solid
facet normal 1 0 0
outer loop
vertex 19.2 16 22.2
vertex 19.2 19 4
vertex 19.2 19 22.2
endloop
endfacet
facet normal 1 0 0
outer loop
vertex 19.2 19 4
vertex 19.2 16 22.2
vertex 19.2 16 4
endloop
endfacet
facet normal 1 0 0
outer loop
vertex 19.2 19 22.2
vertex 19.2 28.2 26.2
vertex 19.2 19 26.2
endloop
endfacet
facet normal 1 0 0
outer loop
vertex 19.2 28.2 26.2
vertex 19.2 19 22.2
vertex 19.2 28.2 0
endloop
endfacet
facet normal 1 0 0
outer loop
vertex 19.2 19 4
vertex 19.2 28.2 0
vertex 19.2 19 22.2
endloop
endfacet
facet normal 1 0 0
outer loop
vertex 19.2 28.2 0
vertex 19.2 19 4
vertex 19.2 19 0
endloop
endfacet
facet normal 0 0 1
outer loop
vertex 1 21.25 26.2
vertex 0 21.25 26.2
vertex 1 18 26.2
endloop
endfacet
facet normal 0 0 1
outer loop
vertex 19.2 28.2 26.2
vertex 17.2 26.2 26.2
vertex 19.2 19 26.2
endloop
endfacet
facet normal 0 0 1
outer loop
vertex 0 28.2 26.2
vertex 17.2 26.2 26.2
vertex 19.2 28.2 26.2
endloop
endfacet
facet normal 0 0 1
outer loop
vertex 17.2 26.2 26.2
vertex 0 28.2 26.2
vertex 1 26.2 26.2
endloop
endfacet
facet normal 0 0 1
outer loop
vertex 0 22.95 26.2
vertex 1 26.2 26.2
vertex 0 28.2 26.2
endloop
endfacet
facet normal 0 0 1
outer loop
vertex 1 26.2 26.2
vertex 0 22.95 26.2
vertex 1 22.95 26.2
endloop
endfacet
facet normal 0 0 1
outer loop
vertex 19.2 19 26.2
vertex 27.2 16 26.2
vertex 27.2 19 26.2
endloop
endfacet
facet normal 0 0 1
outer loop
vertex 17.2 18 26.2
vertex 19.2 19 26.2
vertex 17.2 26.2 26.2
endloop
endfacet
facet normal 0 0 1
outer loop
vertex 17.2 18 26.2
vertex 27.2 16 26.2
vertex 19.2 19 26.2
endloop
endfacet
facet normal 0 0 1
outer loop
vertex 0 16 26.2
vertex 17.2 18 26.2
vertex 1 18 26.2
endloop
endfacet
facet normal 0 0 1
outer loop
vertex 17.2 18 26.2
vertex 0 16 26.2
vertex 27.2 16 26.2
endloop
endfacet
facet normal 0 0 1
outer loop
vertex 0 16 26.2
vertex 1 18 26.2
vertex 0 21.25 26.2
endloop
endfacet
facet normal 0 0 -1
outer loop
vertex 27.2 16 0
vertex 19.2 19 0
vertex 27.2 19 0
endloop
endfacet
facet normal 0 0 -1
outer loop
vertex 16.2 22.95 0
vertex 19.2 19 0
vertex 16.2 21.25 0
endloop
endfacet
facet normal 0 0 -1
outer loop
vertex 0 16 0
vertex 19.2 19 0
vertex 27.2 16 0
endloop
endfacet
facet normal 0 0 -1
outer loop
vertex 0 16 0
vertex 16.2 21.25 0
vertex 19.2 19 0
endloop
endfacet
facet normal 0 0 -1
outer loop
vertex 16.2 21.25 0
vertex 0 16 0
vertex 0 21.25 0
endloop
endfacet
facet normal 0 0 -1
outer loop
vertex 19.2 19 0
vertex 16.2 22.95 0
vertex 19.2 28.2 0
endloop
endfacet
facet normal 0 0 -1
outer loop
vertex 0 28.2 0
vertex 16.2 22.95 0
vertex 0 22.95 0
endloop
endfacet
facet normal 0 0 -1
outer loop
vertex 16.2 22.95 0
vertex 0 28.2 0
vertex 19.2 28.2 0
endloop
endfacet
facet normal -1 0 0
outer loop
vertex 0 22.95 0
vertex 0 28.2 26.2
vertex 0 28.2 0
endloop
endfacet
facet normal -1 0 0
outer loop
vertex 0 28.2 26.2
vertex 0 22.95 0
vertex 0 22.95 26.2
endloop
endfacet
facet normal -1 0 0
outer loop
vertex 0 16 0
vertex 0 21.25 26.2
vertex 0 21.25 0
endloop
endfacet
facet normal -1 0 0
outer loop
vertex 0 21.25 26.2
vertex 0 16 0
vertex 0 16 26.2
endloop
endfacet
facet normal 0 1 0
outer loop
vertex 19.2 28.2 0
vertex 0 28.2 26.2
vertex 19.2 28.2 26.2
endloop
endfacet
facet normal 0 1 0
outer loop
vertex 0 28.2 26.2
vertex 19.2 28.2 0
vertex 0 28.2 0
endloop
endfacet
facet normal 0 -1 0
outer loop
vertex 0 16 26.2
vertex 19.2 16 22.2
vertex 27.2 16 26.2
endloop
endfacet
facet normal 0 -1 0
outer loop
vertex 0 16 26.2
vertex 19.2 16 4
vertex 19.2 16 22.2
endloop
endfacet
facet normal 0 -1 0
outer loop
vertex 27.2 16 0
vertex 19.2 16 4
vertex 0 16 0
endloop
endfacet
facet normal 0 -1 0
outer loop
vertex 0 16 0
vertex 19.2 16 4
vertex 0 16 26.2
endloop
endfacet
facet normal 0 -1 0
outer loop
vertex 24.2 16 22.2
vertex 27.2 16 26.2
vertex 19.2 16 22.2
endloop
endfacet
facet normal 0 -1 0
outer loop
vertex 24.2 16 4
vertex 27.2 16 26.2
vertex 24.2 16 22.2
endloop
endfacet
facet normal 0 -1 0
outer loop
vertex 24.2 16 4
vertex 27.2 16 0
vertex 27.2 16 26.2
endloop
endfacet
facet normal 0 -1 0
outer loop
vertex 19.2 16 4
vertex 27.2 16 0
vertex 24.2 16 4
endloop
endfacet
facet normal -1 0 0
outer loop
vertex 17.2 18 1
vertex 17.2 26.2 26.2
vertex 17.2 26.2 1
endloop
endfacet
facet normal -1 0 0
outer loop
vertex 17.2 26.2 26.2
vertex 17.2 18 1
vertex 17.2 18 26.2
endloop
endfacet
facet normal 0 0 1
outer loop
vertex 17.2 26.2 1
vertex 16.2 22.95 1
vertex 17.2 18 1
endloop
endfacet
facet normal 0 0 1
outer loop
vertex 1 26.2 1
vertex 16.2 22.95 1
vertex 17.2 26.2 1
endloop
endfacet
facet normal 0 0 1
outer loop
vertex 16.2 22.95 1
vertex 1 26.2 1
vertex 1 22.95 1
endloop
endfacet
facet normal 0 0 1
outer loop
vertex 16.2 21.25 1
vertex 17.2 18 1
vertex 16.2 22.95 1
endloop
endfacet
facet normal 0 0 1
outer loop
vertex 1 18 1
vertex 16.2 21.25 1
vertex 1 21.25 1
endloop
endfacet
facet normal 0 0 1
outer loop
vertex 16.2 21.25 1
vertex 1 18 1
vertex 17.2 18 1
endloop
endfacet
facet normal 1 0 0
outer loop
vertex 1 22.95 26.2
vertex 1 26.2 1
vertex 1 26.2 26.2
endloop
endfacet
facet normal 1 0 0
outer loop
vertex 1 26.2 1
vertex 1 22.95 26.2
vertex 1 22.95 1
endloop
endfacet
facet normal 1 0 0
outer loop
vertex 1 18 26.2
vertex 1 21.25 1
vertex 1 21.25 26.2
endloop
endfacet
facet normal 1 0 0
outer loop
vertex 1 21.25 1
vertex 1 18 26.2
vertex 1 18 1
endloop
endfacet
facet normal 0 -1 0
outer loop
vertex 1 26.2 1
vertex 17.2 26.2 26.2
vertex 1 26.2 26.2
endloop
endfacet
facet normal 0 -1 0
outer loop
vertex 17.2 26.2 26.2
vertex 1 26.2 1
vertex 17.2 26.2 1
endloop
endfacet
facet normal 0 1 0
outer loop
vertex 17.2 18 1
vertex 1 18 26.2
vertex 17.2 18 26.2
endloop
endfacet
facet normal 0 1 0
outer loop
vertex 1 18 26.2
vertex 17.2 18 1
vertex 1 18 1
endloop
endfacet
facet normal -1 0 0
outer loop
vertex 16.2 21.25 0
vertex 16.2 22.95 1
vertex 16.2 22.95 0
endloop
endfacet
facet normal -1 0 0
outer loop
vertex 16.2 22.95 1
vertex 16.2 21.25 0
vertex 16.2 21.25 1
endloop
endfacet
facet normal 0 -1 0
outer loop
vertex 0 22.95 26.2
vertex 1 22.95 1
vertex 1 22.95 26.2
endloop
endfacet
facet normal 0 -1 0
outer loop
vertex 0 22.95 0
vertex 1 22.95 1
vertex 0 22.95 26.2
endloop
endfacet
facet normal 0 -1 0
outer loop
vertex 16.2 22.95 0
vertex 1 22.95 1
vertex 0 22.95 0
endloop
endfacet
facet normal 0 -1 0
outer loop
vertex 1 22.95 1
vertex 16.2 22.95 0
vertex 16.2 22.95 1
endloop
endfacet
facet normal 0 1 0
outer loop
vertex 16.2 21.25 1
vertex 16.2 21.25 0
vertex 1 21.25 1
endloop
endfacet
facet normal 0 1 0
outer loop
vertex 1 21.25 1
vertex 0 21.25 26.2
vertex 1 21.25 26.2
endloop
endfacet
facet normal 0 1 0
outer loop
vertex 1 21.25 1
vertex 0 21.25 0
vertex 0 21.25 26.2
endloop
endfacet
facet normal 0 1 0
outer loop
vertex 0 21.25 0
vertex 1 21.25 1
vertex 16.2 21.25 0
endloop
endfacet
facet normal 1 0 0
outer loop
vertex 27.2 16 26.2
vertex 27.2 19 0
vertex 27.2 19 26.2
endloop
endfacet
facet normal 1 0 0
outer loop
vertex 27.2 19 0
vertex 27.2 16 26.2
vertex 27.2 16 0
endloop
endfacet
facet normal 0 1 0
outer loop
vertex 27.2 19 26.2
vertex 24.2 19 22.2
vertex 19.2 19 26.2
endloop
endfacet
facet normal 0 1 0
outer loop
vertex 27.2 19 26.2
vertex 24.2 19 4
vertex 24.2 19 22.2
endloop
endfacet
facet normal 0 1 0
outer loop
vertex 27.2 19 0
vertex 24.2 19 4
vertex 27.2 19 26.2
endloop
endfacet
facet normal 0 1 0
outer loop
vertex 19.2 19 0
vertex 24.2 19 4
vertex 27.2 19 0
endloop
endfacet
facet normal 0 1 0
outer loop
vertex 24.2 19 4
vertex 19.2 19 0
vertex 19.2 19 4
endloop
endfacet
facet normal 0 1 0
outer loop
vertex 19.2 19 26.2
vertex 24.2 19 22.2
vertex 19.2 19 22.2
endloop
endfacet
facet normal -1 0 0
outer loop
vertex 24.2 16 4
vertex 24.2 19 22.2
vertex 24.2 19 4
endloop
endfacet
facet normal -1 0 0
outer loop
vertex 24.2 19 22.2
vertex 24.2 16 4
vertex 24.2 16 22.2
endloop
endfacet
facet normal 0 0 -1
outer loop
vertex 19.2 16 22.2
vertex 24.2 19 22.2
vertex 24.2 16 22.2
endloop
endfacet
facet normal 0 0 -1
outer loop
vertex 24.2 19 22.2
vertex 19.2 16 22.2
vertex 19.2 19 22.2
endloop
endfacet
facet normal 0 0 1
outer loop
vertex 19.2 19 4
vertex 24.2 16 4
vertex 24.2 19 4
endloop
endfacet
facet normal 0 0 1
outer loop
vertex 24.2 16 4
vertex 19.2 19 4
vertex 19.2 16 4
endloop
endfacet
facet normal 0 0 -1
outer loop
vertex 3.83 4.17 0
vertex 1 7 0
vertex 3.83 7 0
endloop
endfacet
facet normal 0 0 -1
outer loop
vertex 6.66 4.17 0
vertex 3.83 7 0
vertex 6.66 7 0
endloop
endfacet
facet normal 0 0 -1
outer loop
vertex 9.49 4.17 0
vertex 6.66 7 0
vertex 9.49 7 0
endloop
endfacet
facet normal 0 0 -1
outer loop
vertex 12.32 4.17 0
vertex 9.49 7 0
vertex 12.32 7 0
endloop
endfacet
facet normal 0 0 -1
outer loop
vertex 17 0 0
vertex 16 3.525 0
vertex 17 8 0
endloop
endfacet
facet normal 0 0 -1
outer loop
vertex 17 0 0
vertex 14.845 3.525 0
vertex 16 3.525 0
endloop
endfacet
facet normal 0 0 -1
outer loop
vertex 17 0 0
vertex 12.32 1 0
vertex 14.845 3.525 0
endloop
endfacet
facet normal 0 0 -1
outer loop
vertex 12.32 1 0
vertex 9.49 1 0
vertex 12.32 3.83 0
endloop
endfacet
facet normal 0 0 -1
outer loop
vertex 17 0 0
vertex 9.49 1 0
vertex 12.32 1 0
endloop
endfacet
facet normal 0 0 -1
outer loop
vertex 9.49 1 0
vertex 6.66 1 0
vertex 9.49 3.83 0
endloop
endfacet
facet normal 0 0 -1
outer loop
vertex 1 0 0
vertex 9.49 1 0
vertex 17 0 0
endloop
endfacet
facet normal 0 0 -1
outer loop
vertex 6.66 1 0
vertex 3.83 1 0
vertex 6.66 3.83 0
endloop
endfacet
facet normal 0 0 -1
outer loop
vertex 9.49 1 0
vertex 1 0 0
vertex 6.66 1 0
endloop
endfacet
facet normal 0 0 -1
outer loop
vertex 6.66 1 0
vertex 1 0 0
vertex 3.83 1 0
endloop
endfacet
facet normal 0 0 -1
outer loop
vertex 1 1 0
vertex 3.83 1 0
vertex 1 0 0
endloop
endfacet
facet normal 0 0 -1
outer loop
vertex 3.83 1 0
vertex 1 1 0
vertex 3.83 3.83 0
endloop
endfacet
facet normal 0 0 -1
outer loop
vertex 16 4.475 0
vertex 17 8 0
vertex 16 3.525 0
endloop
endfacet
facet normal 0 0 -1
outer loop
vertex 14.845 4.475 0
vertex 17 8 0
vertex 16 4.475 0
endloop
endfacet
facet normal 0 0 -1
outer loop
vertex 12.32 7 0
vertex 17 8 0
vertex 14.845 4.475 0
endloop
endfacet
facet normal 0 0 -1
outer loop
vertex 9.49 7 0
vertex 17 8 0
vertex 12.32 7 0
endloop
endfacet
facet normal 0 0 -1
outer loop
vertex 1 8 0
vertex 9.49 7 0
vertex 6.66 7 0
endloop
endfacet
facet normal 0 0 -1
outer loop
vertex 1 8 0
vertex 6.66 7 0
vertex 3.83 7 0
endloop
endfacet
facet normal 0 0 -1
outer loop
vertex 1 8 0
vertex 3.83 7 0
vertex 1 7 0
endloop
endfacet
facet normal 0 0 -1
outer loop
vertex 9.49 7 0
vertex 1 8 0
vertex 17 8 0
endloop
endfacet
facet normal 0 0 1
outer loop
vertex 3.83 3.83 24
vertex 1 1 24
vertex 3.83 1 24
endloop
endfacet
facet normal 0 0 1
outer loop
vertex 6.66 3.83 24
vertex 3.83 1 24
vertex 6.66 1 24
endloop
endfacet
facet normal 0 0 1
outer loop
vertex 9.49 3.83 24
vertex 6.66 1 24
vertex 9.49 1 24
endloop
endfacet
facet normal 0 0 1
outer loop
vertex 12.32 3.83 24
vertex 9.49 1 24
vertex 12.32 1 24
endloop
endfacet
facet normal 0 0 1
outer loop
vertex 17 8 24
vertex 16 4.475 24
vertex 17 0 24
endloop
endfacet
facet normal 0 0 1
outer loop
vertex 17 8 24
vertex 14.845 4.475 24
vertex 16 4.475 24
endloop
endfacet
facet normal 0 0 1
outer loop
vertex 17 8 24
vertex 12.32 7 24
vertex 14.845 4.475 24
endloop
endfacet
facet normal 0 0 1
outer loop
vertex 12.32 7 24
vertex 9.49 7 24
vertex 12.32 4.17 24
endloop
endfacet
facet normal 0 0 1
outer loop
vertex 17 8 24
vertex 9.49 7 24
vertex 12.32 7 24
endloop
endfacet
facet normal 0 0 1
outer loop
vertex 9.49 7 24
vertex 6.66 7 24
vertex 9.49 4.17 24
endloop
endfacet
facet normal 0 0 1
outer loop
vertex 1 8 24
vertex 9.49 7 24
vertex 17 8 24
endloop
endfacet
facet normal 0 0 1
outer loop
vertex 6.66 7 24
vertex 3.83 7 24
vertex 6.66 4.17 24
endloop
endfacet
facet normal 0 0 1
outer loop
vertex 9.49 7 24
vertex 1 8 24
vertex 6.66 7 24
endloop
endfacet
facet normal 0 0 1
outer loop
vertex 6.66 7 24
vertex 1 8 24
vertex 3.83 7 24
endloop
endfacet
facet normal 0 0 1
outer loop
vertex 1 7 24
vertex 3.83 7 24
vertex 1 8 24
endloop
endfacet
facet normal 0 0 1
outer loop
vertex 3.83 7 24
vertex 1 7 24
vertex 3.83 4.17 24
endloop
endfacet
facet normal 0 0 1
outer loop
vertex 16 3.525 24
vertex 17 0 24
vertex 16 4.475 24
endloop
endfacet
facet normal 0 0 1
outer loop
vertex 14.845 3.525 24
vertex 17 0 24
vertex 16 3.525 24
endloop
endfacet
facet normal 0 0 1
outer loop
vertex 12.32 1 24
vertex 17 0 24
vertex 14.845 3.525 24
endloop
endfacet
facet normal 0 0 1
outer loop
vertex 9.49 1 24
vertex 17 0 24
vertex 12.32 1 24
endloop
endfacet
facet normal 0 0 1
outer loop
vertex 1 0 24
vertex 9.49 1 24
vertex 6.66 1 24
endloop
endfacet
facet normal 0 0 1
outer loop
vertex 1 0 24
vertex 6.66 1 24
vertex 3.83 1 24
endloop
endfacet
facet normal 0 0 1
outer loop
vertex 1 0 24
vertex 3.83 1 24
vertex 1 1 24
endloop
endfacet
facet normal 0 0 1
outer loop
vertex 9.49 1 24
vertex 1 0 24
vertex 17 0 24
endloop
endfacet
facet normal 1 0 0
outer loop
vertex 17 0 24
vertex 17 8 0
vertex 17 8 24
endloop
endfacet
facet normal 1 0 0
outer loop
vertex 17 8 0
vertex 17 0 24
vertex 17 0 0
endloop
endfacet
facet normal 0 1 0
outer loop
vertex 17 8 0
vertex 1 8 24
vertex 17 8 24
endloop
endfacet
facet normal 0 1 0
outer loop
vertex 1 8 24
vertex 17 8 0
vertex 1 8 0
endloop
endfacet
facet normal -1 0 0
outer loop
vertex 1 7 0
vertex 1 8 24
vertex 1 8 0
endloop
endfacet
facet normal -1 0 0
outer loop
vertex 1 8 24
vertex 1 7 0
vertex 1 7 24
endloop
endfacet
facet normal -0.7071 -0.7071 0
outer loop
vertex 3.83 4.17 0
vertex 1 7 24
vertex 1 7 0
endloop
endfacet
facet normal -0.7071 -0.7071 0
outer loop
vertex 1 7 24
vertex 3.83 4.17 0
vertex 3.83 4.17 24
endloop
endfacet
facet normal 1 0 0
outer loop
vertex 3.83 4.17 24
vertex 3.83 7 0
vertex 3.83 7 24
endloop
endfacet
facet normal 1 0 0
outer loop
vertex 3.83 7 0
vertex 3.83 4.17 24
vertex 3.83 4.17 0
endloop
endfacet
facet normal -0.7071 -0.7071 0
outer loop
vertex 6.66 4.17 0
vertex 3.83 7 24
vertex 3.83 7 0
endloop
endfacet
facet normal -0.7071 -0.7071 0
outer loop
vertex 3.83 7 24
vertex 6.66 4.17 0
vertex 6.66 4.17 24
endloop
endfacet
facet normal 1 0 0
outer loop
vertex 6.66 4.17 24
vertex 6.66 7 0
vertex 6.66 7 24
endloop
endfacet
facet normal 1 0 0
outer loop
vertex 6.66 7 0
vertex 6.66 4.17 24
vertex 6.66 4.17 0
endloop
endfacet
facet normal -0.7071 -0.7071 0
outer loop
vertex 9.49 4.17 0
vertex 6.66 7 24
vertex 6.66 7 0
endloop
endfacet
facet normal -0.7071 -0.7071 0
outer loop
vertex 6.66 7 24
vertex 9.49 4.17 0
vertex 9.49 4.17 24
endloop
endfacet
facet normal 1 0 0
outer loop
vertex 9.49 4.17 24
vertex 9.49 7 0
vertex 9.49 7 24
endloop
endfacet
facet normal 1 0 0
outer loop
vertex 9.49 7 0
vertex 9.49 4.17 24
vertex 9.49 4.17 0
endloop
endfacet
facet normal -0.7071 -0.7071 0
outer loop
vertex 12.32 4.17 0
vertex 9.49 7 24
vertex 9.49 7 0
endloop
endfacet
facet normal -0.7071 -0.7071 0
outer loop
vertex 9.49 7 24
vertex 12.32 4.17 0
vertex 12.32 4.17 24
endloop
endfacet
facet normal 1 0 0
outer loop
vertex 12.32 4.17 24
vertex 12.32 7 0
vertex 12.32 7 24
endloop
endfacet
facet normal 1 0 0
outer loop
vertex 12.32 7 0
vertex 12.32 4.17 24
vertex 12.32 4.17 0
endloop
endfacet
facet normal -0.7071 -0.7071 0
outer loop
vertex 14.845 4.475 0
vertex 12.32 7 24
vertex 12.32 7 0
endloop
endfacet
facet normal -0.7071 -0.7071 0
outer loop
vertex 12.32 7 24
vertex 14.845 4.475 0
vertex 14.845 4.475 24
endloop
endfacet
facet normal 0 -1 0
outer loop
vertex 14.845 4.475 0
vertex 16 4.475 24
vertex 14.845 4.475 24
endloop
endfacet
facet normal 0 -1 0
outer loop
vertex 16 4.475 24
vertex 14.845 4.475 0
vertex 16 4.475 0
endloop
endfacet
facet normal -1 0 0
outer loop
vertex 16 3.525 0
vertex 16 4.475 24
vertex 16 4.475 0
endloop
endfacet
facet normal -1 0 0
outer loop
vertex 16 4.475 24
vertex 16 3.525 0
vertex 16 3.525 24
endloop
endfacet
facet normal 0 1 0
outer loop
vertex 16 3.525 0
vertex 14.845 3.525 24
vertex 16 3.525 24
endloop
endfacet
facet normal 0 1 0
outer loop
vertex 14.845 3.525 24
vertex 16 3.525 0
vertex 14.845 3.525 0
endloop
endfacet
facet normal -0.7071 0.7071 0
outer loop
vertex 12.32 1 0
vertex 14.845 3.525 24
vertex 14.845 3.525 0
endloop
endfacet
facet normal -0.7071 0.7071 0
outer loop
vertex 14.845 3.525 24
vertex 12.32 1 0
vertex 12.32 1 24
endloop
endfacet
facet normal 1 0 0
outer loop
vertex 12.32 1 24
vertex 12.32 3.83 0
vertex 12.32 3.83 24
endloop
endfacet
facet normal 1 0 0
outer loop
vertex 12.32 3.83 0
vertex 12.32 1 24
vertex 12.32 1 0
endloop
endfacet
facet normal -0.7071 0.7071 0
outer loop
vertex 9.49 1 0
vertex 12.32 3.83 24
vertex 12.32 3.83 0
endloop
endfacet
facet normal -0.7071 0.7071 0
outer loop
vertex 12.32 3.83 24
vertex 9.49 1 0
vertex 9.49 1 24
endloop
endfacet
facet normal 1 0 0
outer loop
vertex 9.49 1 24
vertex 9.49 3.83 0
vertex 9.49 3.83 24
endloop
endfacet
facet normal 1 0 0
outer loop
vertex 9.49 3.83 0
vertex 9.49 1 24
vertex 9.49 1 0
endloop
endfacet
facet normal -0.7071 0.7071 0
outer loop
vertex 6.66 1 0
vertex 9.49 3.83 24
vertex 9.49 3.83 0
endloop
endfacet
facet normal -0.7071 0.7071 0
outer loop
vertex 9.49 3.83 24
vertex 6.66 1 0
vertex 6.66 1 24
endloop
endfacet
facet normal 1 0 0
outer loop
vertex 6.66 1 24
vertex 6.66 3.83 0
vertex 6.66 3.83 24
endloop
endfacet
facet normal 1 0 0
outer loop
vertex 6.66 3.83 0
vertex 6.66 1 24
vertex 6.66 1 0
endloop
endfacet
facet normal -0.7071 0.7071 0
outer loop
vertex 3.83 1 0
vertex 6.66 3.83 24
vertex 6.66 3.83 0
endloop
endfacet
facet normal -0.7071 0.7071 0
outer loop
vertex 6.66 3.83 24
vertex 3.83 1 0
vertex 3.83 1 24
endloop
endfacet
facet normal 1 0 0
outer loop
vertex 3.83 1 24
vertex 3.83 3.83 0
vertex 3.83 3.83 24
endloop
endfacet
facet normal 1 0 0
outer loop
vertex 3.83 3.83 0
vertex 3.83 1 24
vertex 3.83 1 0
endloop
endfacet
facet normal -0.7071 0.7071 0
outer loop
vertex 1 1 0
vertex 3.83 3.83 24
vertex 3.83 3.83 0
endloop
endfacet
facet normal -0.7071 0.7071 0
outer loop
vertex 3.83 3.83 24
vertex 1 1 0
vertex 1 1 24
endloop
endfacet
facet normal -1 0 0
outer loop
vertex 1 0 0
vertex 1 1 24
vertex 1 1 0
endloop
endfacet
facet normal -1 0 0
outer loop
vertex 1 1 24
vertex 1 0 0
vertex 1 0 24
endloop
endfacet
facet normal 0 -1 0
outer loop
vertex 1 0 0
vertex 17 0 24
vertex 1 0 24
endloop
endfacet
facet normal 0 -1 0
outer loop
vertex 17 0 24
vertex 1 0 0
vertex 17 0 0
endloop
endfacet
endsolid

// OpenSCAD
// a friction-based badge holder made of of a TPU core and a PLA shell

// parameters
// ----------

thickness = 8; // mm, thickness of TPU core
height = thickness * 2; // mm, height of TPU core
width = height * 1.5; // mm, width of TPU core
slot = 0.85; // mm, thickness of card slot in TPU core
tooth_slot_scaling = 0.4; // multiplier, scale teeth to be tighter than slot
part_tolerance = 0.1; // mm, tolerance gap allowed by shell around core
flange_hole = 5; // mm, space inside flange loop

// choose which pieces to render, since they are different materials
inside = true;
shell = true;

// ----------

// calculations for gap between teeth based on stack of right triangles
tooth_height = (thickness - 2)/2;
tooth_step = tooth_height - (slot * tooth_slot_scaling)/2;

if (inside) {
    translate([1, 0, 0]) {
        difference() {
            linear_extrude(width) {
                difference() {
                    // main body
                    square([height, thickness]);
                    // top slot
                    translate([height - 1 - tooth_height, (thickness - (slot + 0.1)) / 2]) {
                        square([tooth_height, slot + 0.1]);
                    }
                    // teeth
                    for (i = [tooth_height:tooth_step:height-1]) {
                        polygon([[i, thickness/2], [i-tooth_height, 1], [i-tooth_height,thickness-1]]);
                    }
                }
            }
            // cross slot
            // translate([0, 1, (width - 1) / 2]) {
            //    cube([height - 1, thickness - 2, 1]);
            //}
    }
    }
}

if (shell) {
    hole_thickness = thickness + part_tolerance * 2;
    hole_height = height + part_tolerance * 2;
    hole_width = width + part_tolerance * 2;

    translate([0, thickness * 2, 0]) {
        // shell
        difference() {
            // main shell
            cube([hole_height + 3, hole_thickness + 4, hole_width + 2]);
            // cut out big hole
            translate([1,2,1]) {
                cube([hole_height, hole_thickness, hole_width + 1]);
            }
            // cut out card slot
            translate([0, (hole_thickness + 4 - slot * 2) / 2, 0]) {
                cube([hole_height, slot * 2, hole_width + 2]);
            }
        }

        // top loop flange
        difference() {
            // flange
            translate([hole_height + 3, 0, 0]) {
                cube([3 + flange_hole, 3, hole_width + 2]);
            }
            // hole in flange
            translate([hole_height + 3, 0, 4]) {
                cube([flange_hole, 3, hole_width + 2 - 8]);
            }
        }
    }
}
